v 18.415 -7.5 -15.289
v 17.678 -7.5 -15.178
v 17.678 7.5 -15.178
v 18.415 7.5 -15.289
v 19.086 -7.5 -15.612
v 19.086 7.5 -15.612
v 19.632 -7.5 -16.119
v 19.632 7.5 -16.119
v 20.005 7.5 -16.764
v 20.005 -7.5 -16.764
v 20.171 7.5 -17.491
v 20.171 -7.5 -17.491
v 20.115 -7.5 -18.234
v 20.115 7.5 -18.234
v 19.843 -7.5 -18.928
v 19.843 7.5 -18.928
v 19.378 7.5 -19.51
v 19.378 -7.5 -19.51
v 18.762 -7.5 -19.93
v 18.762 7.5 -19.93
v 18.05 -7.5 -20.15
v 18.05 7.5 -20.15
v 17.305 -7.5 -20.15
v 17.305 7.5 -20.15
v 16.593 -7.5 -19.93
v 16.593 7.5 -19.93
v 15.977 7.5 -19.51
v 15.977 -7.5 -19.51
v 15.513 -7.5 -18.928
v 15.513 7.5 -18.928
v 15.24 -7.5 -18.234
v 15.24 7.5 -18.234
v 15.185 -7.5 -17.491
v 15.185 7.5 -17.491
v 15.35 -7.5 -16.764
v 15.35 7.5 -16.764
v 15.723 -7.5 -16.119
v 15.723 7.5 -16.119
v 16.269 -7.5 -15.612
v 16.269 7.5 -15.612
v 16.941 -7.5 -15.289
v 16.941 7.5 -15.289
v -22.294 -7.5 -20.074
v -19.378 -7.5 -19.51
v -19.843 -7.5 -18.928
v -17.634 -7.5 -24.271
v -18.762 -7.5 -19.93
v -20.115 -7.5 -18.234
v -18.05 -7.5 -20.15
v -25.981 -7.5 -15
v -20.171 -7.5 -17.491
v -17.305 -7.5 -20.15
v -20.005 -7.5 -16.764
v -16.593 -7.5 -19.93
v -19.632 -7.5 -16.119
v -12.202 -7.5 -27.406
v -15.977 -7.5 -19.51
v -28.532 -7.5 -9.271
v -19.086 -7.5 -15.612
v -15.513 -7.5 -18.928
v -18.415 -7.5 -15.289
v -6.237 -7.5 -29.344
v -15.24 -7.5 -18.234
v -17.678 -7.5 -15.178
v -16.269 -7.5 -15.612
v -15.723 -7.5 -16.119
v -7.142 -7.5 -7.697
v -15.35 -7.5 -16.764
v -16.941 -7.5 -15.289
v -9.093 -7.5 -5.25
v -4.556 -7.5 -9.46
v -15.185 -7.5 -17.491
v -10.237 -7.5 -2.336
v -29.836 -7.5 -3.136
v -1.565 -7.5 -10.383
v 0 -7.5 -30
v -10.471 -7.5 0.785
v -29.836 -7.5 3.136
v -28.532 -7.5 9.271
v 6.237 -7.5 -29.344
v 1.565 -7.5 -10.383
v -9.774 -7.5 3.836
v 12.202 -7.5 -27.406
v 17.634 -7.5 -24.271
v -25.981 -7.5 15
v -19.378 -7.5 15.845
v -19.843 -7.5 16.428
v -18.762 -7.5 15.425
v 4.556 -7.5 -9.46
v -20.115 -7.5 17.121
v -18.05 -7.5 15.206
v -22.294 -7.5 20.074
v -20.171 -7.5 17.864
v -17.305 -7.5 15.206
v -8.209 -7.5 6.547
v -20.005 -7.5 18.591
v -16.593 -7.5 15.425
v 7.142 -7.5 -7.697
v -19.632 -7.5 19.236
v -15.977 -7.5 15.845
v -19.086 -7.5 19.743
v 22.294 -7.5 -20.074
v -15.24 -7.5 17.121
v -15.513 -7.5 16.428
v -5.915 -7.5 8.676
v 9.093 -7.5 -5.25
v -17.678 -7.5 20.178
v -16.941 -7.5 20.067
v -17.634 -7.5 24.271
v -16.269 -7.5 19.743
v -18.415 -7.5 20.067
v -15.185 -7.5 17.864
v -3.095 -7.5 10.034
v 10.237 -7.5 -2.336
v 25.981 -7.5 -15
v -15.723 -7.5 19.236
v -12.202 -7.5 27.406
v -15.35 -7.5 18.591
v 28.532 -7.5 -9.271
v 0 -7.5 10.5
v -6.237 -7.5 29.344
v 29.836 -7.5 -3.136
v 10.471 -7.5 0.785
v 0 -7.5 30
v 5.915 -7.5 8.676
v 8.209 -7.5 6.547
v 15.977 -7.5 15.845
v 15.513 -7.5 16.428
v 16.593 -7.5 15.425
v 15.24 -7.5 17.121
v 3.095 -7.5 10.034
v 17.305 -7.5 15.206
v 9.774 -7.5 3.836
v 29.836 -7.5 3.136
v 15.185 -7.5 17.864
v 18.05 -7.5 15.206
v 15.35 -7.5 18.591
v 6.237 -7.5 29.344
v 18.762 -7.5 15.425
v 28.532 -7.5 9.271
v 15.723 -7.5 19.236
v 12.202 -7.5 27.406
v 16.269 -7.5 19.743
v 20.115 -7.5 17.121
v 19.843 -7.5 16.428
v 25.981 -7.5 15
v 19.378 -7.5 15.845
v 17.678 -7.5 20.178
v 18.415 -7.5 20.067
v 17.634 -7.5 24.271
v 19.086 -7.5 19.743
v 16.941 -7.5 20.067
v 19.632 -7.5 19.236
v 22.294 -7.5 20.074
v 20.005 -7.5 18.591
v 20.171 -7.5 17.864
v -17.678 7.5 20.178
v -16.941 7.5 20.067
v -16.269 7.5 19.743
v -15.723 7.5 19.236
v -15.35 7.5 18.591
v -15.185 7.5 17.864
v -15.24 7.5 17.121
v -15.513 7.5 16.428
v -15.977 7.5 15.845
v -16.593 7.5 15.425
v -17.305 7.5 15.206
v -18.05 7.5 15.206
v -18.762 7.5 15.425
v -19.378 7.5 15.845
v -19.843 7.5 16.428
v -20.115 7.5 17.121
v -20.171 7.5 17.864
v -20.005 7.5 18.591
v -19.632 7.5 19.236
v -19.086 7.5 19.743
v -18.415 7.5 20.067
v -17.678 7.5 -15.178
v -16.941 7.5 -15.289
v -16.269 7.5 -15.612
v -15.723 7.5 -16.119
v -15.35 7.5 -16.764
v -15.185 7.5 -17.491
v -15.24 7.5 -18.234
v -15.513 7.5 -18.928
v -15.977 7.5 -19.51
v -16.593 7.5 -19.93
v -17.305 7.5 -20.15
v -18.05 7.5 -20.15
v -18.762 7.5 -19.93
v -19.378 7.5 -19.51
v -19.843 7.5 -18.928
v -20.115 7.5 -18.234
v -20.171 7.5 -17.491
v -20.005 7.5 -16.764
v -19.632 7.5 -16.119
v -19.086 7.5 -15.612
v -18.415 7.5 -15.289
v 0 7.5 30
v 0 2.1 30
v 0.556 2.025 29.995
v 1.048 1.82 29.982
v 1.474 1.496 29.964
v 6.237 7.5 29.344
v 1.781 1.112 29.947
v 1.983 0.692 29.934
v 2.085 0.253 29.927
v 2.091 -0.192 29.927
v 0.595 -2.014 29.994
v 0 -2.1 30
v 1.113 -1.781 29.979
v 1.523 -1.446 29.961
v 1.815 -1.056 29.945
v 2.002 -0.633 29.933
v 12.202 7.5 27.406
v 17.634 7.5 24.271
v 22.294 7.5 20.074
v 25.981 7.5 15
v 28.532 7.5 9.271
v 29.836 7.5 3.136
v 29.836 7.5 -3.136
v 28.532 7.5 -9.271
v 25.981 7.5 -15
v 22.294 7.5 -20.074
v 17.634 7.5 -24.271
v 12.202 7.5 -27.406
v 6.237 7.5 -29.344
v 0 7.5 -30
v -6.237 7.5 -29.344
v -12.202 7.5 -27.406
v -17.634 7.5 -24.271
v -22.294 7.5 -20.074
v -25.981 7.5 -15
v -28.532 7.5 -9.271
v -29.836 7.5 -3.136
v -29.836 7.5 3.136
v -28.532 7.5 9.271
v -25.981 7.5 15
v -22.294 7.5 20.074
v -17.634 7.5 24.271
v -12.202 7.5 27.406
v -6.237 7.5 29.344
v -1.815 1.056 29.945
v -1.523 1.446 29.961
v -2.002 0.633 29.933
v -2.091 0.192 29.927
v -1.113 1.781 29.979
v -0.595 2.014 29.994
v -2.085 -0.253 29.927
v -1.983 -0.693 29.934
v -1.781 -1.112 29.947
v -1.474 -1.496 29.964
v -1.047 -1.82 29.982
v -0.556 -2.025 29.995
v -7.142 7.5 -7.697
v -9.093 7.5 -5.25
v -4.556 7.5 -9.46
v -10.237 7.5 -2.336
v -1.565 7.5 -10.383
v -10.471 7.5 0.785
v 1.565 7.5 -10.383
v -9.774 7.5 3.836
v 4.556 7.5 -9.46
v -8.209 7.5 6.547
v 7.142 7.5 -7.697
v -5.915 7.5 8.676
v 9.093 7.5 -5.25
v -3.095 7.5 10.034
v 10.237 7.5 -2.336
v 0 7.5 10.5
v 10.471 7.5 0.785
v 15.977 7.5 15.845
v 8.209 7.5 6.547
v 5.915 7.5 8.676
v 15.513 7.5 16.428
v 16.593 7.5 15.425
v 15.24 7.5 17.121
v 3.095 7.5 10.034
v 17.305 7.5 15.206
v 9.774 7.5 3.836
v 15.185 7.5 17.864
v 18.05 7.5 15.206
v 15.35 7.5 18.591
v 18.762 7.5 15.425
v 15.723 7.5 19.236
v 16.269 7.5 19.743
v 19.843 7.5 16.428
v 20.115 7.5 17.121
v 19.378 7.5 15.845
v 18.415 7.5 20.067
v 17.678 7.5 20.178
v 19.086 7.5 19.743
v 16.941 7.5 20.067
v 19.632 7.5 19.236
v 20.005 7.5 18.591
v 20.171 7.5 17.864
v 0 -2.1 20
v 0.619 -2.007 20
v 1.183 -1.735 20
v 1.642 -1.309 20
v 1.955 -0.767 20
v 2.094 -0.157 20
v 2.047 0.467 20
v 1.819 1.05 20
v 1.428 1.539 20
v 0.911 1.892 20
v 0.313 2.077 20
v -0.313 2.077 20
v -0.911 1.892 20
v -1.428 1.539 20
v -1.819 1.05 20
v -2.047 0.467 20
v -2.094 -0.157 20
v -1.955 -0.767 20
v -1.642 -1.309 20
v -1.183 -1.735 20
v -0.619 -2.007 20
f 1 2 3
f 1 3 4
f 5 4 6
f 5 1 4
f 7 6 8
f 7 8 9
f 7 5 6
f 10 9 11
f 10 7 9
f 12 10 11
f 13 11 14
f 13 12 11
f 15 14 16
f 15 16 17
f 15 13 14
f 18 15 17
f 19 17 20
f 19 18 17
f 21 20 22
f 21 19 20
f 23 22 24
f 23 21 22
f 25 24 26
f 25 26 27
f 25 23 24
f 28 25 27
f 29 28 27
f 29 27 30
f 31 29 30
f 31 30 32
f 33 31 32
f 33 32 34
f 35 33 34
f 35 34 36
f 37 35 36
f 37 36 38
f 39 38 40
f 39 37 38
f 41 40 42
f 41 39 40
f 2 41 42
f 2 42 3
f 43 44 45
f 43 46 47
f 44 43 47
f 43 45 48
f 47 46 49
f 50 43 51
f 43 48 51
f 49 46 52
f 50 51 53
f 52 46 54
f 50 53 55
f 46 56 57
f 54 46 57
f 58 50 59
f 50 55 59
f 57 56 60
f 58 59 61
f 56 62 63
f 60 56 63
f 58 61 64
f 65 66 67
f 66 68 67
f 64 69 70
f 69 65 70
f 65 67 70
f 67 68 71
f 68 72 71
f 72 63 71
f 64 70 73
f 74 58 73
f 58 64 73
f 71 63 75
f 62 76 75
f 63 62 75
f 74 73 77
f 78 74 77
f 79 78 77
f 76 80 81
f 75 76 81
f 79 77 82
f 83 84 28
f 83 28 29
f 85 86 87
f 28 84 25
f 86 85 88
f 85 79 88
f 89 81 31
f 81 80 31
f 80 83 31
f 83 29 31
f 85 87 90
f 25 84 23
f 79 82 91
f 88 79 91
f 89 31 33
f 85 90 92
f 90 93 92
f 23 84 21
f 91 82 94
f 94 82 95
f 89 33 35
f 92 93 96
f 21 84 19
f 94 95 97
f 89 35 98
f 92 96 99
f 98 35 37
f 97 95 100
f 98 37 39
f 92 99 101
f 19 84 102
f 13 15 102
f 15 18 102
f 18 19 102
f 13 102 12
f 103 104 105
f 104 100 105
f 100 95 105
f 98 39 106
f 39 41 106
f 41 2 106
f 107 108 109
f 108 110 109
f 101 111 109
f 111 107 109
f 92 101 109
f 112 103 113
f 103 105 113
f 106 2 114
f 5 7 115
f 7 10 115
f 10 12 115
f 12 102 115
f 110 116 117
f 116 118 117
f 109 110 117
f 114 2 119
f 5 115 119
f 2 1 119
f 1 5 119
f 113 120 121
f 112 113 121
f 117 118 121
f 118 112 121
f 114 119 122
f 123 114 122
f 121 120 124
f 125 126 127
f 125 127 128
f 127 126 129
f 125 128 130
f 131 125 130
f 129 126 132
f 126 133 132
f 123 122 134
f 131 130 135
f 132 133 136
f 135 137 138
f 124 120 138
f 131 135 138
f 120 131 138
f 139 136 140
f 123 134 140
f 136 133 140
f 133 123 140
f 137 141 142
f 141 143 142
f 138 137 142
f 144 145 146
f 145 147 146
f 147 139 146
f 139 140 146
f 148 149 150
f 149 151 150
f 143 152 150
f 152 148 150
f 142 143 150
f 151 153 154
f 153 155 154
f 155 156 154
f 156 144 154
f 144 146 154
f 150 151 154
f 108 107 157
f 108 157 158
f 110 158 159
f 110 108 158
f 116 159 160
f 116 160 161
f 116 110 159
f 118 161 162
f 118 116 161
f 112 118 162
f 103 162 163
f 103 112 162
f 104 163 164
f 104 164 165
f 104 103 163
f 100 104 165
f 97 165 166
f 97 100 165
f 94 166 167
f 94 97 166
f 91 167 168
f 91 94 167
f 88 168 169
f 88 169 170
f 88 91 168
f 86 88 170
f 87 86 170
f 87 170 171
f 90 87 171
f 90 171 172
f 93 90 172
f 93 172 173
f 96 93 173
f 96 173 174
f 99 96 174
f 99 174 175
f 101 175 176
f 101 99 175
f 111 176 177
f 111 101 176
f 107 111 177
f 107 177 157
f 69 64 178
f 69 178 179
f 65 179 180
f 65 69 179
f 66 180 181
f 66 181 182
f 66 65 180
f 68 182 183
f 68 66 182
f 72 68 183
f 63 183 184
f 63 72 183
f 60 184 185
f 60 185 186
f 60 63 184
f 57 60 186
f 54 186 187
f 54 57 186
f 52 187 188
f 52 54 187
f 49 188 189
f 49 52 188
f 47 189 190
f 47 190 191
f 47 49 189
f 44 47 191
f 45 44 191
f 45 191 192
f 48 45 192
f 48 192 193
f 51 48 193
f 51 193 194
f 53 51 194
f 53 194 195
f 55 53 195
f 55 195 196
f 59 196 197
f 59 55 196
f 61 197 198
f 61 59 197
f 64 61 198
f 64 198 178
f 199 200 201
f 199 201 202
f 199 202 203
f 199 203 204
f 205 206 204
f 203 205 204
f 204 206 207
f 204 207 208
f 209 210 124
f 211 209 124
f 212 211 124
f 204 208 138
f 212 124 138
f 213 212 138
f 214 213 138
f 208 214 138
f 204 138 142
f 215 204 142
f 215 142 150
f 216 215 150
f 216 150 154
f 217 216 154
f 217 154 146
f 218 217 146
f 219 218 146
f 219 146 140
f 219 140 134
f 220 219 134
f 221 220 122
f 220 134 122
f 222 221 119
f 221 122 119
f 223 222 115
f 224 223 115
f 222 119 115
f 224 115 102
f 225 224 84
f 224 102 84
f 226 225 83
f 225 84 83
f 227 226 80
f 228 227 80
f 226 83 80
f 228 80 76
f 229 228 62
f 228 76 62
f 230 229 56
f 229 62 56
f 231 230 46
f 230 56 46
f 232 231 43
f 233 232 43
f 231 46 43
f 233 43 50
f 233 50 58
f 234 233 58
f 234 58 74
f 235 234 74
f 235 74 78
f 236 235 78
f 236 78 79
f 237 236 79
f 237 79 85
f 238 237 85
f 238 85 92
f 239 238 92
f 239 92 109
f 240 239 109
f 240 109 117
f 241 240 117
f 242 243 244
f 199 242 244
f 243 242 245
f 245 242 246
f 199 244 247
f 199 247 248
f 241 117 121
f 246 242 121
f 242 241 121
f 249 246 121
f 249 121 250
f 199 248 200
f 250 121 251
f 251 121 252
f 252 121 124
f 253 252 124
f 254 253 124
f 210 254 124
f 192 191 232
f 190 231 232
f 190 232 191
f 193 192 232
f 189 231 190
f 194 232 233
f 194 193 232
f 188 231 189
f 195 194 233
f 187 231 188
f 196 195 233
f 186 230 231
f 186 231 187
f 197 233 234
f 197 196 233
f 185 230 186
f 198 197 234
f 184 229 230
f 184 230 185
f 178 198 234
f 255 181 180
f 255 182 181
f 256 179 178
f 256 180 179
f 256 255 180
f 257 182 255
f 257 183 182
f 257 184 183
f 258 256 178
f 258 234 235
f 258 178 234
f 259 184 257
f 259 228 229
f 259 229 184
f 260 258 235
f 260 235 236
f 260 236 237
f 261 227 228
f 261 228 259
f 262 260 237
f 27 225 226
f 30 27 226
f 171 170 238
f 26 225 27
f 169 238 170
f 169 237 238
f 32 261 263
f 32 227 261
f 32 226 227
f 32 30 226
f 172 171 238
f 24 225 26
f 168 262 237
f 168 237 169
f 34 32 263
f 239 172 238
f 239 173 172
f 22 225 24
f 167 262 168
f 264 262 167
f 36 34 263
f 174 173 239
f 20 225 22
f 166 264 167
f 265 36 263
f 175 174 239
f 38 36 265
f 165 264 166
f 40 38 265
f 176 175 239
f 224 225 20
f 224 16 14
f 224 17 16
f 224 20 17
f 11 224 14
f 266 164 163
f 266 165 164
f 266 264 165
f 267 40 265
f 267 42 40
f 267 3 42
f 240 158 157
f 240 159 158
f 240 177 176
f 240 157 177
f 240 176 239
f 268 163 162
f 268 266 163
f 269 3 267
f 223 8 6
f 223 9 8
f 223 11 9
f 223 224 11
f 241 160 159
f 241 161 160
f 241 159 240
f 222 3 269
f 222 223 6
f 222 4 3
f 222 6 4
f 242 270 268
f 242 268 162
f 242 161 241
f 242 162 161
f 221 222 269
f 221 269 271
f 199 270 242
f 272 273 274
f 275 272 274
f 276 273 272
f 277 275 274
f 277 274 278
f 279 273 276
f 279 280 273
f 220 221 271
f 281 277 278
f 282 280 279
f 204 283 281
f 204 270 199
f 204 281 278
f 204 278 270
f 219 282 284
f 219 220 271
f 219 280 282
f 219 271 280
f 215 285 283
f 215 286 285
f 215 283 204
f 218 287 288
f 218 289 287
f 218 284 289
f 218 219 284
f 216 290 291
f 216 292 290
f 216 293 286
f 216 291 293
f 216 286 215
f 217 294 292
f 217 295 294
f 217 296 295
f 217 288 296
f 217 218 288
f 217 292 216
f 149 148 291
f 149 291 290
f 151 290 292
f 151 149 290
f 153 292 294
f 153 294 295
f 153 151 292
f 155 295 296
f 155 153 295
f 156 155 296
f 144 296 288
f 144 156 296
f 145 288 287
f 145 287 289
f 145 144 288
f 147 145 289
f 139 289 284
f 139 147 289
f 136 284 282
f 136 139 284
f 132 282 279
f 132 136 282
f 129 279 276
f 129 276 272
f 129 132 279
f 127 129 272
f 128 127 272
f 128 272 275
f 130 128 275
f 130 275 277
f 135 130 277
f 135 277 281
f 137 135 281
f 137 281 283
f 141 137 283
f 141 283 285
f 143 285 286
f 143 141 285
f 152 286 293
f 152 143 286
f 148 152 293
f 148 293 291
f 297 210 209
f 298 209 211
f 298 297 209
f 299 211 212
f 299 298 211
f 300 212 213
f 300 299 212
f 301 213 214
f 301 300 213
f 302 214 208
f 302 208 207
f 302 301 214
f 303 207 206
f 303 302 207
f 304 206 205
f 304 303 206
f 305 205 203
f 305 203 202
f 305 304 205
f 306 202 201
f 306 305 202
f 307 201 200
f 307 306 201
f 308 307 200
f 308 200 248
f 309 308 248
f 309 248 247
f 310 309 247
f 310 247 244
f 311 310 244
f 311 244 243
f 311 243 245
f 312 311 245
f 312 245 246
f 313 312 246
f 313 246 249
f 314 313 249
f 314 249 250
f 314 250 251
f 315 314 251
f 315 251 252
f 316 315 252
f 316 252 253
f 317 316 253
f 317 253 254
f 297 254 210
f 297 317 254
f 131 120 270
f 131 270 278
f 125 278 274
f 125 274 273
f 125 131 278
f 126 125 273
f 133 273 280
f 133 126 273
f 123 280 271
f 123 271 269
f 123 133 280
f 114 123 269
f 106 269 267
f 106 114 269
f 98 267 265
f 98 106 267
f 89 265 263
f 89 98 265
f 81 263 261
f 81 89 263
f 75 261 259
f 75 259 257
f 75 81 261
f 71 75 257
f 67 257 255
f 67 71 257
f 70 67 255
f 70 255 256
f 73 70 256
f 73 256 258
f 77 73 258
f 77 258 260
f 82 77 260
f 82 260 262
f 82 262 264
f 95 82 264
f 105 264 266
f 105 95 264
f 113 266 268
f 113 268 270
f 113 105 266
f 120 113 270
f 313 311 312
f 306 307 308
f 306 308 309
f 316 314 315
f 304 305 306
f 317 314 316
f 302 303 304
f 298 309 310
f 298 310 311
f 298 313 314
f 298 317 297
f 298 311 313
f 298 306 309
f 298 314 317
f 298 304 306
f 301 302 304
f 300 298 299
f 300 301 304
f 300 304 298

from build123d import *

# Parameters (mm, degrees)
BOSS_EXTRUDE1_DEPTH      = 7.5
BOSS_EXTRUDE1_DEPTH_BACK = 7.5
SKETCH1_R                = 30
SKETCH1_R_2              = 10.5
SKETCH1_R_3              = 2.5
CUT_EXTRUDE2_START       = 20
SKETCH2_R                = 2.1
CUT_EXTRUDE2_DEPTH       = 10


with BuildPart() as part:
    # Sketch1 → Boss-Extrude1 (new, two sides: drawn at the far end of the back side and taken through both)
    with BuildSketch(Plane(origin=(0, 0, 0), x_dir=(1, 0, 0), z_dir=(0, 1, 0)).offset(-BOSS_EXTRUDE1_DEPTH_BACK)):
        Circle(SKETCH1_R)
        Circle(SKETCH1_R_2, mode=Mode.SUBTRACT)
        with Locations((17.67766953, 17.67766953)):
            Circle(SKETCH1_R_3, mode=Mode.SUBTRACT)
        with Locations((17.67766953, -17.67766953)):
            Circle(SKETCH1_R_3, mode=Mode.SUBTRACT)
        with Locations((-17.67766953, -17.67766953)):
            Circle(SKETCH1_R_3, mode=Mode.SUBTRACT)
        with Locations((-17.67766953, 17.67766953)):
            Circle(SKETCH1_R_3, mode=Mode.SUBTRACT)
    extrude(amount=BOSS_EXTRUDE1_DEPTH + BOSS_EXTRUDE1_DEPTH_BACK)

    # Sketch2 → Cut-Extrude2 (cut)
    with BuildSketch(Plane.XY.offset(CUT_EXTRUDE2_START)):
        Circle(SKETCH2_R)
    extrude(amount=CUT_EXTRUDE2_DEPTH, mode=Mode.SUBTRACT)


solid = part.part
